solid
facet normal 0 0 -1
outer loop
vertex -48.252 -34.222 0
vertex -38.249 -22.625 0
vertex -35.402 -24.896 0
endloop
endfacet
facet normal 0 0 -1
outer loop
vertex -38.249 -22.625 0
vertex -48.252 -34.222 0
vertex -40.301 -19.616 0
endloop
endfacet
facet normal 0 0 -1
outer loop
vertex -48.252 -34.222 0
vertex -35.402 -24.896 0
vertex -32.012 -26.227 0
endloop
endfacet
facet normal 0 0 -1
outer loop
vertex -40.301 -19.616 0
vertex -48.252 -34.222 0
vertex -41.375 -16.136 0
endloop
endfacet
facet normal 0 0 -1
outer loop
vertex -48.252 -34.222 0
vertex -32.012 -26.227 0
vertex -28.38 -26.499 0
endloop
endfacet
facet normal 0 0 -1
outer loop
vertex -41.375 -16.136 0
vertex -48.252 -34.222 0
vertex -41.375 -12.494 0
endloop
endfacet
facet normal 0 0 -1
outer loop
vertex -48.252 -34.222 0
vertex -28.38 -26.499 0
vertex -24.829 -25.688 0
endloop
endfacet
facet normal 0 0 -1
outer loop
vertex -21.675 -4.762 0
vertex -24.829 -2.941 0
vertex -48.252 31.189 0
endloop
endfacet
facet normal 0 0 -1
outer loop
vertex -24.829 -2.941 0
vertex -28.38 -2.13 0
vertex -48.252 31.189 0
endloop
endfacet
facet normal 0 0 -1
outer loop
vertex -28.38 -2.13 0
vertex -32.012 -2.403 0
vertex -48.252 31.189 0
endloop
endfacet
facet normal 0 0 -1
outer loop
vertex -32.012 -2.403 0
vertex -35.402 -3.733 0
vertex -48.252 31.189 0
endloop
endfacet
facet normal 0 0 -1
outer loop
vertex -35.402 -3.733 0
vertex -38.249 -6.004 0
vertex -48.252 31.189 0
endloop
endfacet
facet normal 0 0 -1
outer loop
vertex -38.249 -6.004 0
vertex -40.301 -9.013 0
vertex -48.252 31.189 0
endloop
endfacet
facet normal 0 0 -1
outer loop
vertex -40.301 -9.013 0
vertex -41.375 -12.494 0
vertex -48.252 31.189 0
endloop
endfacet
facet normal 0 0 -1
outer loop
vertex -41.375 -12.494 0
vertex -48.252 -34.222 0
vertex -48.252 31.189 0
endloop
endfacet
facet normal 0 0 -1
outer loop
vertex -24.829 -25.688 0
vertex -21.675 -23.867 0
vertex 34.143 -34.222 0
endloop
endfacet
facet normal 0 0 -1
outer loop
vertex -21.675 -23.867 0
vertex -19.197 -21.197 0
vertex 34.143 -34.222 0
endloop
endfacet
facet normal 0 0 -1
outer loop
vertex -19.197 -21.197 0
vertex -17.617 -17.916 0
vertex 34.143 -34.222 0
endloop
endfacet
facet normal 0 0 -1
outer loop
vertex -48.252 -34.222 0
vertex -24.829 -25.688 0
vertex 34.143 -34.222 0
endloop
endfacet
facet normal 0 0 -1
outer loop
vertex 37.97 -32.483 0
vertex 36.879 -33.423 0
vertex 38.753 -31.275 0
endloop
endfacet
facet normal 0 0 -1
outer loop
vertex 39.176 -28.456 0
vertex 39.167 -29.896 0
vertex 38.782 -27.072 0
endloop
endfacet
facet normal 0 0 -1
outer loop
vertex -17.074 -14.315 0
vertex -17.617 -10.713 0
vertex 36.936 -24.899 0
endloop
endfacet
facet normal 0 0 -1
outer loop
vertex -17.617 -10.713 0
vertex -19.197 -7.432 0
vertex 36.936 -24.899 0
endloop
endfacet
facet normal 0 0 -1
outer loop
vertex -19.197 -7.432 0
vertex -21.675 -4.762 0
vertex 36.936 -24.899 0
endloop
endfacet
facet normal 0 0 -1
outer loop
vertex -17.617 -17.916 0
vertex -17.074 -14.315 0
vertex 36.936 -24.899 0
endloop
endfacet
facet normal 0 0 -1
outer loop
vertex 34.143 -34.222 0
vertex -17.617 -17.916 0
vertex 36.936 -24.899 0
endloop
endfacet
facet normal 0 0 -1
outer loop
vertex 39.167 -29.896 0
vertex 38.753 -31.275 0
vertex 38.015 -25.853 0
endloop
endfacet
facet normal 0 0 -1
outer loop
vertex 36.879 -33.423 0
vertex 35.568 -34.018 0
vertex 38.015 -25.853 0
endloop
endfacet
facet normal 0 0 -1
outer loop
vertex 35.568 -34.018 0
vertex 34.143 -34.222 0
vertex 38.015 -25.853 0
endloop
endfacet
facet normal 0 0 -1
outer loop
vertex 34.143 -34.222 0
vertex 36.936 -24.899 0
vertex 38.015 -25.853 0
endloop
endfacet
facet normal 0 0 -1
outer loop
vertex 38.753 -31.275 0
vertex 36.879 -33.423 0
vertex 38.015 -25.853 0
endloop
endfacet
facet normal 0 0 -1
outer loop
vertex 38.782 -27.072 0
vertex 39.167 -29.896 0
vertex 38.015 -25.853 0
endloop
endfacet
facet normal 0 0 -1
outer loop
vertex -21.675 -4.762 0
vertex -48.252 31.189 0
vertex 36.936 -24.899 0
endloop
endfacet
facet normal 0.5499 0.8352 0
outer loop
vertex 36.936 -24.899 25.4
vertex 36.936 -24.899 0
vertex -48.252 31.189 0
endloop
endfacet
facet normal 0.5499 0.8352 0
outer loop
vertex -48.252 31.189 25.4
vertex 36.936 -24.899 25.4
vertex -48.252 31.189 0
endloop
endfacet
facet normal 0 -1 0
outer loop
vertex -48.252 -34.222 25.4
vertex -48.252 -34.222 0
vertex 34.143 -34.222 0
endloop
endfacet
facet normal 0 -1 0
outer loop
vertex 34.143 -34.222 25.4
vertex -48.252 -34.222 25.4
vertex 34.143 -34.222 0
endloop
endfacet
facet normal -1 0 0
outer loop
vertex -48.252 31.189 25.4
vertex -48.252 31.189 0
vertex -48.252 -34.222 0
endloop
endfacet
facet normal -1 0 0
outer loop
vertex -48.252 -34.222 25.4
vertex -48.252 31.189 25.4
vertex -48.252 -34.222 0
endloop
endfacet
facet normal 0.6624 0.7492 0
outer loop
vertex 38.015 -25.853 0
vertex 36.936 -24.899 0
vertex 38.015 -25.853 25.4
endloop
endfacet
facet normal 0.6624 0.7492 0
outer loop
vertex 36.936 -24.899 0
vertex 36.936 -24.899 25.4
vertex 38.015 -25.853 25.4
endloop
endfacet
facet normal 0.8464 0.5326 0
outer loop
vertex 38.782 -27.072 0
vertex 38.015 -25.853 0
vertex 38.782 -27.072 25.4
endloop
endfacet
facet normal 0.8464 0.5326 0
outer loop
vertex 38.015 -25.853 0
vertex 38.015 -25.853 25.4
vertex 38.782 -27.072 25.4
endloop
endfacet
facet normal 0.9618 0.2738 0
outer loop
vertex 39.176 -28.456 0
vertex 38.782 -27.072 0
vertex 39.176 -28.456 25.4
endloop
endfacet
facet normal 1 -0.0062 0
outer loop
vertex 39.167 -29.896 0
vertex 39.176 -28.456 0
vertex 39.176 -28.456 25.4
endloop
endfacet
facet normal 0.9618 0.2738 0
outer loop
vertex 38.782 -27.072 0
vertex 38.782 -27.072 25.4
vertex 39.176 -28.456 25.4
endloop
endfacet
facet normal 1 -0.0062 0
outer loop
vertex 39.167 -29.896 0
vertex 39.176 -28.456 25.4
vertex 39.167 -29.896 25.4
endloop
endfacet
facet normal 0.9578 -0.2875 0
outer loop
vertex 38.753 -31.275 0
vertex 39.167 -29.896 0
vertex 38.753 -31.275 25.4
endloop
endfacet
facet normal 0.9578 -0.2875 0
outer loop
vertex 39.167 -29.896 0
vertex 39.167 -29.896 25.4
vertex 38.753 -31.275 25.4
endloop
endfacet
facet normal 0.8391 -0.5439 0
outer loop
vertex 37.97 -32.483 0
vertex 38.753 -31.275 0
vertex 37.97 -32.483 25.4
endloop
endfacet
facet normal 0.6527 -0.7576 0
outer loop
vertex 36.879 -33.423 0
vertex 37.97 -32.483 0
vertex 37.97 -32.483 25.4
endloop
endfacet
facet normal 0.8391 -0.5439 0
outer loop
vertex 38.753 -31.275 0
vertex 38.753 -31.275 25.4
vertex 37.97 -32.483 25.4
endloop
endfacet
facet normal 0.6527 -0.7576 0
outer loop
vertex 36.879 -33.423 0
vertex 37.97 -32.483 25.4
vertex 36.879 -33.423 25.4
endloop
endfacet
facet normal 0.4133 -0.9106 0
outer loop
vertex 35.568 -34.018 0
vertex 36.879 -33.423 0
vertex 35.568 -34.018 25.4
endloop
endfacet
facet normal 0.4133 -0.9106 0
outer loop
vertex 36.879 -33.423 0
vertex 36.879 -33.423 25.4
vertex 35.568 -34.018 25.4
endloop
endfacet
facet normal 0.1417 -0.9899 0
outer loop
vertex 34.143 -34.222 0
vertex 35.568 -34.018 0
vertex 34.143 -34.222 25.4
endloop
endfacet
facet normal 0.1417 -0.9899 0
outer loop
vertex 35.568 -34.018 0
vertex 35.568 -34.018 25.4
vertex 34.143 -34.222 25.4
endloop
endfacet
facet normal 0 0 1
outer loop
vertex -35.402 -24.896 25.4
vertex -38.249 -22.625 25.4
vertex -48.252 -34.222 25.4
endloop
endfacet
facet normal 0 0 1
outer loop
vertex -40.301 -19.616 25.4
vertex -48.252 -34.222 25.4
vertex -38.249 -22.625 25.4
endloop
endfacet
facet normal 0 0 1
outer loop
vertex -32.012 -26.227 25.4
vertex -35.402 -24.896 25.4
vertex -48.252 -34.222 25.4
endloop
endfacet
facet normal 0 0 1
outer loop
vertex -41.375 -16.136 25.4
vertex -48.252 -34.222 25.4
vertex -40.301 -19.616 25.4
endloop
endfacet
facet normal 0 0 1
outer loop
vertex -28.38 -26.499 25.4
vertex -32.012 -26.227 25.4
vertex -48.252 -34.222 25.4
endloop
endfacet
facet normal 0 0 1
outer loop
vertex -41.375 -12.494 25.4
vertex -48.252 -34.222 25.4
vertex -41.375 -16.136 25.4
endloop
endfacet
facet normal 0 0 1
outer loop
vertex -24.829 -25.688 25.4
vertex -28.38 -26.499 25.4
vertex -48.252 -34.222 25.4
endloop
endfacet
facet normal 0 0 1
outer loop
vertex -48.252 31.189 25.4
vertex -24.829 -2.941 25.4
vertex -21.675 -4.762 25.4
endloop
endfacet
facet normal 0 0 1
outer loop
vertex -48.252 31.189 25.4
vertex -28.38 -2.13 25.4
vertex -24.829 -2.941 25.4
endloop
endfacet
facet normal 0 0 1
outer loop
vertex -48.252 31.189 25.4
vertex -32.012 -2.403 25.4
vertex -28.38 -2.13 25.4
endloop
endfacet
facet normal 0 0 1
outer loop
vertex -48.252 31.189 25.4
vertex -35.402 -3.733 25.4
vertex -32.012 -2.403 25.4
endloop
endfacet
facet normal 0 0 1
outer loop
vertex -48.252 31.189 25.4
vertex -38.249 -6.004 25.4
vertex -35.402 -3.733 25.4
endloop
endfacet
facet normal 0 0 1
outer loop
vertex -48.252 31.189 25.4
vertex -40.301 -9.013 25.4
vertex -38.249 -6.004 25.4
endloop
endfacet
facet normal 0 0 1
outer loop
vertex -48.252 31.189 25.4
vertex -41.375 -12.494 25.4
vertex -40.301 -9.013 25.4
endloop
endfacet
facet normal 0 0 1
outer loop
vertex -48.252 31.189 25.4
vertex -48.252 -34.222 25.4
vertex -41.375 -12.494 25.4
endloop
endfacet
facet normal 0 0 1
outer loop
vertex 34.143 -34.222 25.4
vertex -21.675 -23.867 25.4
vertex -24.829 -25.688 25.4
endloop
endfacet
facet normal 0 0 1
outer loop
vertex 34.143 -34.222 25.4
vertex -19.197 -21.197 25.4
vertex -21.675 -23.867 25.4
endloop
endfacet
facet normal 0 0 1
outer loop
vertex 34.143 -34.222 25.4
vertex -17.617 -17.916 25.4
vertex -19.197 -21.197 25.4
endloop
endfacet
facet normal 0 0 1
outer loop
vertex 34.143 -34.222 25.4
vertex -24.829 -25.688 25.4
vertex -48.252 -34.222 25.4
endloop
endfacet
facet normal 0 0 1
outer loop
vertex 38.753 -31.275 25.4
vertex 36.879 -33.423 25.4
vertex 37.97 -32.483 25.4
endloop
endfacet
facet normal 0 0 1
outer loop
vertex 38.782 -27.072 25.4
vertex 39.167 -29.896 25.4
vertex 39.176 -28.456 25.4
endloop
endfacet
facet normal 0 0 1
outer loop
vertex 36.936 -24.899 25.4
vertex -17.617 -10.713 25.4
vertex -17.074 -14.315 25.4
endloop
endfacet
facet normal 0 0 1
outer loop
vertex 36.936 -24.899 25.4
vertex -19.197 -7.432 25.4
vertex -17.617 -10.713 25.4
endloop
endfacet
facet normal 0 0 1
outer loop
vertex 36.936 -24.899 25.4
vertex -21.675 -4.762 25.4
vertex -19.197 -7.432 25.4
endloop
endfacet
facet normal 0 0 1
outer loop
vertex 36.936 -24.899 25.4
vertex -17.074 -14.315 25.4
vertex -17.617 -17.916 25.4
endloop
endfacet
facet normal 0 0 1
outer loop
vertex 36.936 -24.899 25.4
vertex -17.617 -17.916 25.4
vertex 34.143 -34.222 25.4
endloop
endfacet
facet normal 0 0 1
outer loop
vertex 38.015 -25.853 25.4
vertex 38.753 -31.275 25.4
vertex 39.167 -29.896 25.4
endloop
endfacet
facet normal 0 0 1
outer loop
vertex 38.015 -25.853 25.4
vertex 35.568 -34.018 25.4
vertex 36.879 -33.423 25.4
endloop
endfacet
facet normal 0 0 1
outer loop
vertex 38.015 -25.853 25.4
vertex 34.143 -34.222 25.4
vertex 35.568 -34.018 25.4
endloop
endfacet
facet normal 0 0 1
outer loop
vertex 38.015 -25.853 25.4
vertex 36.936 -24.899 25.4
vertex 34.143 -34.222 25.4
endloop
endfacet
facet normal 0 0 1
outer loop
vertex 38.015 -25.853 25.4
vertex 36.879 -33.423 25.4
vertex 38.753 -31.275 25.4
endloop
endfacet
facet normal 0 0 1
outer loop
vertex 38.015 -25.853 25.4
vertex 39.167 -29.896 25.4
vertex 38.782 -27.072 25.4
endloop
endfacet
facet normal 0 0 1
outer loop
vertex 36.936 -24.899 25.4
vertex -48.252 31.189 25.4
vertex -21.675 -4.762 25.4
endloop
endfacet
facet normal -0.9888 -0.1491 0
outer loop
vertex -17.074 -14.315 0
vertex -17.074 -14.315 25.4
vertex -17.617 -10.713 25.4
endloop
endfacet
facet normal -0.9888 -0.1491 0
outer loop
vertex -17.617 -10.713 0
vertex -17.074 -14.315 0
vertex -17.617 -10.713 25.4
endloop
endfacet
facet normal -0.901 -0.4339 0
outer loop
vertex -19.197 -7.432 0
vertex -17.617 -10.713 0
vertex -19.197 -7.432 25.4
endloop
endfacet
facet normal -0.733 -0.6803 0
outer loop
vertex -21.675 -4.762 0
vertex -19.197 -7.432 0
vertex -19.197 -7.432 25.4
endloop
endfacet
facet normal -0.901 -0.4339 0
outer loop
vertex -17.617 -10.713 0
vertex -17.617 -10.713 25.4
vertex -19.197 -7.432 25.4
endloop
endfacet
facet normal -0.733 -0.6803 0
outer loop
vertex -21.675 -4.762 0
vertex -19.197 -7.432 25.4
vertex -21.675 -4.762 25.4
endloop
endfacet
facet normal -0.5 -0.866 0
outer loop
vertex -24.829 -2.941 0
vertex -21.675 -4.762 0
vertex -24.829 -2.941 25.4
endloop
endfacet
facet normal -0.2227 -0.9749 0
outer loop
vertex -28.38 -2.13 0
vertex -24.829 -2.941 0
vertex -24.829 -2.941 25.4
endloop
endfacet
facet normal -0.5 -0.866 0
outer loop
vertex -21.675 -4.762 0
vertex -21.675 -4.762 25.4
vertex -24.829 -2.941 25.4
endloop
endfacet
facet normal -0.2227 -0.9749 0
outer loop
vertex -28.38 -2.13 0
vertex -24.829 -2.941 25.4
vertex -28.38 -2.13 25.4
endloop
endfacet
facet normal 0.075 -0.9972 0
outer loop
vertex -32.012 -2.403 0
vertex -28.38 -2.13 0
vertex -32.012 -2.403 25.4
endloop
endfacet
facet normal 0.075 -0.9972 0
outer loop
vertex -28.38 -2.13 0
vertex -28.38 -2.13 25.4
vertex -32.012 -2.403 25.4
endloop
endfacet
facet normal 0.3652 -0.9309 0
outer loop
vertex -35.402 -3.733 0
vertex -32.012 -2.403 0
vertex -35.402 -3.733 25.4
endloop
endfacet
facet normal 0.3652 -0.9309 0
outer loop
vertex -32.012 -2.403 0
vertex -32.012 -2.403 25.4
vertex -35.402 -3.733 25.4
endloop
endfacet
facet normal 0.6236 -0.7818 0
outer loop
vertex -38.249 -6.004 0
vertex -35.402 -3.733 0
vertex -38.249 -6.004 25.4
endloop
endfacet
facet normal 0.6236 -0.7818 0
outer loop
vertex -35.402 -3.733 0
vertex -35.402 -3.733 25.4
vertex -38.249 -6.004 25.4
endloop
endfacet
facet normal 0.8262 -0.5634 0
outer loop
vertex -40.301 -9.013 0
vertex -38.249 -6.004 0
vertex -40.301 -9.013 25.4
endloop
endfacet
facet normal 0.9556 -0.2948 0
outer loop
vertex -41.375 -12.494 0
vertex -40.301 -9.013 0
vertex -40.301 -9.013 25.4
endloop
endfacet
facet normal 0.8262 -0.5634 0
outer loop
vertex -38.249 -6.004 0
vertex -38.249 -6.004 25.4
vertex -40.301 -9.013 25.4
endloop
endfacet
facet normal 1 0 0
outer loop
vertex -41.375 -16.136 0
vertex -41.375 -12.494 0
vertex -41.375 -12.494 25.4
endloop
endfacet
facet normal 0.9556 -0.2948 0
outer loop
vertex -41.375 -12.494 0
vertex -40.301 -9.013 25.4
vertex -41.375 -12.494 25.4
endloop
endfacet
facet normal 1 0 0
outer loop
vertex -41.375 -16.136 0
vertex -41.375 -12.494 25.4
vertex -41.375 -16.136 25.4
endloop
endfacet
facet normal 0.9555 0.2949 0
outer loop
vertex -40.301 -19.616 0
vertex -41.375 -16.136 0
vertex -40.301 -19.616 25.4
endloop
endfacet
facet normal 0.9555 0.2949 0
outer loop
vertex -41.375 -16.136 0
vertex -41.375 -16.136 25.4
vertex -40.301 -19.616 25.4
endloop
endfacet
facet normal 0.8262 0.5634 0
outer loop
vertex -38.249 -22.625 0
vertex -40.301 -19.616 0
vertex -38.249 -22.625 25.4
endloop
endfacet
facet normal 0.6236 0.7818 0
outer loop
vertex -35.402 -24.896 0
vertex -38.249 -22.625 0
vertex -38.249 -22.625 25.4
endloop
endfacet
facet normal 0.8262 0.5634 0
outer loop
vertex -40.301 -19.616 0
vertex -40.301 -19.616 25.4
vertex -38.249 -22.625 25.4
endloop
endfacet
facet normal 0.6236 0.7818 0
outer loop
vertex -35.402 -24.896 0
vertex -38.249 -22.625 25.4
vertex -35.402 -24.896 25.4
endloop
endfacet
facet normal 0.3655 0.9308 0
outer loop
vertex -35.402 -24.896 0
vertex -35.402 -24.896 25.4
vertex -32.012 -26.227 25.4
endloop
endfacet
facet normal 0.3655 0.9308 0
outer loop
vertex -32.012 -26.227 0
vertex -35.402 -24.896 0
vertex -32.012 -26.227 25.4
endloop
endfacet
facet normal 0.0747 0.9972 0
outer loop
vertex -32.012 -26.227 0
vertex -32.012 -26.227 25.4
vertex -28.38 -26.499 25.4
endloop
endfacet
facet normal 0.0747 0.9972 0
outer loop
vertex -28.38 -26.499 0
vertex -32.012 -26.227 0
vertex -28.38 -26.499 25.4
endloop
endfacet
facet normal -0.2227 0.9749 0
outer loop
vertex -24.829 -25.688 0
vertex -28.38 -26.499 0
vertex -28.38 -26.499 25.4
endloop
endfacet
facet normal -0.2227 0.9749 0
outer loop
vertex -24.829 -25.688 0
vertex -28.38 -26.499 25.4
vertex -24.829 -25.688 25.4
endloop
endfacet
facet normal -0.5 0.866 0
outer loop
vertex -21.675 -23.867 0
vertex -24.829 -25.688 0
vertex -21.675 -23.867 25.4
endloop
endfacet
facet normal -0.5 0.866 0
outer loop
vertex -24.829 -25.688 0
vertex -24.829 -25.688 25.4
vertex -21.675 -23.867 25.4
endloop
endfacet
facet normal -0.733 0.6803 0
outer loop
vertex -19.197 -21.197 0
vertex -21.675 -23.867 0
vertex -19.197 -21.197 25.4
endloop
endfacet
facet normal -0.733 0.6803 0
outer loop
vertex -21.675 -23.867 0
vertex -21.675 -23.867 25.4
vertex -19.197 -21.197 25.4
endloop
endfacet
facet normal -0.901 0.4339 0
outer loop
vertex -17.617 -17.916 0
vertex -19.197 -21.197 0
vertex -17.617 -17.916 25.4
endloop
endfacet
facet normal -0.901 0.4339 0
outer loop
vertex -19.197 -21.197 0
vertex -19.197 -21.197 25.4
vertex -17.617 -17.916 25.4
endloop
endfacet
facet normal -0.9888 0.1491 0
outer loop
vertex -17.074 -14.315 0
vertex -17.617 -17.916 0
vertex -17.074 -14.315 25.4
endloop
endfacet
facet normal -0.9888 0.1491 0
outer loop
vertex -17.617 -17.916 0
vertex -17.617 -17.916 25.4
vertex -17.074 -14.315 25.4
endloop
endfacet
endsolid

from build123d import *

# Parameters (mm, degrees)
F1_DEPTH = 25.4
F2_R     = 5.08
F3_R     = 12.218355
F4_DEPTH = 25.4


with BuildPart() as f1:
    # F0 (on Top) → F1 (new body)
    with BuildSketch(Plane.XY):
        Polygon((51.096436, -34.222286), (-48.252478, 31.188732), (-48.252478, -34.222286), align=None)
    extrude(amount=F1_DEPTH)

    # F2
    f2_edges = [f1.edges().sort_by_distance(p)[0] for p in [
        (51.096436, -34.222286, 12.7),
    ]]
    fillet(f2_edges, radius=F2_R)

    # F3 (on face) → F4 (cut)
    with BuildSketch(Plane.XY.offset(25.4)):
        with Locations((-29.29276, -14.314586)):
            Circle(F3_R)
    extrude(amount=-F4_DEPTH, mode=Mode.SUBTRACT)


solid = f1.part
